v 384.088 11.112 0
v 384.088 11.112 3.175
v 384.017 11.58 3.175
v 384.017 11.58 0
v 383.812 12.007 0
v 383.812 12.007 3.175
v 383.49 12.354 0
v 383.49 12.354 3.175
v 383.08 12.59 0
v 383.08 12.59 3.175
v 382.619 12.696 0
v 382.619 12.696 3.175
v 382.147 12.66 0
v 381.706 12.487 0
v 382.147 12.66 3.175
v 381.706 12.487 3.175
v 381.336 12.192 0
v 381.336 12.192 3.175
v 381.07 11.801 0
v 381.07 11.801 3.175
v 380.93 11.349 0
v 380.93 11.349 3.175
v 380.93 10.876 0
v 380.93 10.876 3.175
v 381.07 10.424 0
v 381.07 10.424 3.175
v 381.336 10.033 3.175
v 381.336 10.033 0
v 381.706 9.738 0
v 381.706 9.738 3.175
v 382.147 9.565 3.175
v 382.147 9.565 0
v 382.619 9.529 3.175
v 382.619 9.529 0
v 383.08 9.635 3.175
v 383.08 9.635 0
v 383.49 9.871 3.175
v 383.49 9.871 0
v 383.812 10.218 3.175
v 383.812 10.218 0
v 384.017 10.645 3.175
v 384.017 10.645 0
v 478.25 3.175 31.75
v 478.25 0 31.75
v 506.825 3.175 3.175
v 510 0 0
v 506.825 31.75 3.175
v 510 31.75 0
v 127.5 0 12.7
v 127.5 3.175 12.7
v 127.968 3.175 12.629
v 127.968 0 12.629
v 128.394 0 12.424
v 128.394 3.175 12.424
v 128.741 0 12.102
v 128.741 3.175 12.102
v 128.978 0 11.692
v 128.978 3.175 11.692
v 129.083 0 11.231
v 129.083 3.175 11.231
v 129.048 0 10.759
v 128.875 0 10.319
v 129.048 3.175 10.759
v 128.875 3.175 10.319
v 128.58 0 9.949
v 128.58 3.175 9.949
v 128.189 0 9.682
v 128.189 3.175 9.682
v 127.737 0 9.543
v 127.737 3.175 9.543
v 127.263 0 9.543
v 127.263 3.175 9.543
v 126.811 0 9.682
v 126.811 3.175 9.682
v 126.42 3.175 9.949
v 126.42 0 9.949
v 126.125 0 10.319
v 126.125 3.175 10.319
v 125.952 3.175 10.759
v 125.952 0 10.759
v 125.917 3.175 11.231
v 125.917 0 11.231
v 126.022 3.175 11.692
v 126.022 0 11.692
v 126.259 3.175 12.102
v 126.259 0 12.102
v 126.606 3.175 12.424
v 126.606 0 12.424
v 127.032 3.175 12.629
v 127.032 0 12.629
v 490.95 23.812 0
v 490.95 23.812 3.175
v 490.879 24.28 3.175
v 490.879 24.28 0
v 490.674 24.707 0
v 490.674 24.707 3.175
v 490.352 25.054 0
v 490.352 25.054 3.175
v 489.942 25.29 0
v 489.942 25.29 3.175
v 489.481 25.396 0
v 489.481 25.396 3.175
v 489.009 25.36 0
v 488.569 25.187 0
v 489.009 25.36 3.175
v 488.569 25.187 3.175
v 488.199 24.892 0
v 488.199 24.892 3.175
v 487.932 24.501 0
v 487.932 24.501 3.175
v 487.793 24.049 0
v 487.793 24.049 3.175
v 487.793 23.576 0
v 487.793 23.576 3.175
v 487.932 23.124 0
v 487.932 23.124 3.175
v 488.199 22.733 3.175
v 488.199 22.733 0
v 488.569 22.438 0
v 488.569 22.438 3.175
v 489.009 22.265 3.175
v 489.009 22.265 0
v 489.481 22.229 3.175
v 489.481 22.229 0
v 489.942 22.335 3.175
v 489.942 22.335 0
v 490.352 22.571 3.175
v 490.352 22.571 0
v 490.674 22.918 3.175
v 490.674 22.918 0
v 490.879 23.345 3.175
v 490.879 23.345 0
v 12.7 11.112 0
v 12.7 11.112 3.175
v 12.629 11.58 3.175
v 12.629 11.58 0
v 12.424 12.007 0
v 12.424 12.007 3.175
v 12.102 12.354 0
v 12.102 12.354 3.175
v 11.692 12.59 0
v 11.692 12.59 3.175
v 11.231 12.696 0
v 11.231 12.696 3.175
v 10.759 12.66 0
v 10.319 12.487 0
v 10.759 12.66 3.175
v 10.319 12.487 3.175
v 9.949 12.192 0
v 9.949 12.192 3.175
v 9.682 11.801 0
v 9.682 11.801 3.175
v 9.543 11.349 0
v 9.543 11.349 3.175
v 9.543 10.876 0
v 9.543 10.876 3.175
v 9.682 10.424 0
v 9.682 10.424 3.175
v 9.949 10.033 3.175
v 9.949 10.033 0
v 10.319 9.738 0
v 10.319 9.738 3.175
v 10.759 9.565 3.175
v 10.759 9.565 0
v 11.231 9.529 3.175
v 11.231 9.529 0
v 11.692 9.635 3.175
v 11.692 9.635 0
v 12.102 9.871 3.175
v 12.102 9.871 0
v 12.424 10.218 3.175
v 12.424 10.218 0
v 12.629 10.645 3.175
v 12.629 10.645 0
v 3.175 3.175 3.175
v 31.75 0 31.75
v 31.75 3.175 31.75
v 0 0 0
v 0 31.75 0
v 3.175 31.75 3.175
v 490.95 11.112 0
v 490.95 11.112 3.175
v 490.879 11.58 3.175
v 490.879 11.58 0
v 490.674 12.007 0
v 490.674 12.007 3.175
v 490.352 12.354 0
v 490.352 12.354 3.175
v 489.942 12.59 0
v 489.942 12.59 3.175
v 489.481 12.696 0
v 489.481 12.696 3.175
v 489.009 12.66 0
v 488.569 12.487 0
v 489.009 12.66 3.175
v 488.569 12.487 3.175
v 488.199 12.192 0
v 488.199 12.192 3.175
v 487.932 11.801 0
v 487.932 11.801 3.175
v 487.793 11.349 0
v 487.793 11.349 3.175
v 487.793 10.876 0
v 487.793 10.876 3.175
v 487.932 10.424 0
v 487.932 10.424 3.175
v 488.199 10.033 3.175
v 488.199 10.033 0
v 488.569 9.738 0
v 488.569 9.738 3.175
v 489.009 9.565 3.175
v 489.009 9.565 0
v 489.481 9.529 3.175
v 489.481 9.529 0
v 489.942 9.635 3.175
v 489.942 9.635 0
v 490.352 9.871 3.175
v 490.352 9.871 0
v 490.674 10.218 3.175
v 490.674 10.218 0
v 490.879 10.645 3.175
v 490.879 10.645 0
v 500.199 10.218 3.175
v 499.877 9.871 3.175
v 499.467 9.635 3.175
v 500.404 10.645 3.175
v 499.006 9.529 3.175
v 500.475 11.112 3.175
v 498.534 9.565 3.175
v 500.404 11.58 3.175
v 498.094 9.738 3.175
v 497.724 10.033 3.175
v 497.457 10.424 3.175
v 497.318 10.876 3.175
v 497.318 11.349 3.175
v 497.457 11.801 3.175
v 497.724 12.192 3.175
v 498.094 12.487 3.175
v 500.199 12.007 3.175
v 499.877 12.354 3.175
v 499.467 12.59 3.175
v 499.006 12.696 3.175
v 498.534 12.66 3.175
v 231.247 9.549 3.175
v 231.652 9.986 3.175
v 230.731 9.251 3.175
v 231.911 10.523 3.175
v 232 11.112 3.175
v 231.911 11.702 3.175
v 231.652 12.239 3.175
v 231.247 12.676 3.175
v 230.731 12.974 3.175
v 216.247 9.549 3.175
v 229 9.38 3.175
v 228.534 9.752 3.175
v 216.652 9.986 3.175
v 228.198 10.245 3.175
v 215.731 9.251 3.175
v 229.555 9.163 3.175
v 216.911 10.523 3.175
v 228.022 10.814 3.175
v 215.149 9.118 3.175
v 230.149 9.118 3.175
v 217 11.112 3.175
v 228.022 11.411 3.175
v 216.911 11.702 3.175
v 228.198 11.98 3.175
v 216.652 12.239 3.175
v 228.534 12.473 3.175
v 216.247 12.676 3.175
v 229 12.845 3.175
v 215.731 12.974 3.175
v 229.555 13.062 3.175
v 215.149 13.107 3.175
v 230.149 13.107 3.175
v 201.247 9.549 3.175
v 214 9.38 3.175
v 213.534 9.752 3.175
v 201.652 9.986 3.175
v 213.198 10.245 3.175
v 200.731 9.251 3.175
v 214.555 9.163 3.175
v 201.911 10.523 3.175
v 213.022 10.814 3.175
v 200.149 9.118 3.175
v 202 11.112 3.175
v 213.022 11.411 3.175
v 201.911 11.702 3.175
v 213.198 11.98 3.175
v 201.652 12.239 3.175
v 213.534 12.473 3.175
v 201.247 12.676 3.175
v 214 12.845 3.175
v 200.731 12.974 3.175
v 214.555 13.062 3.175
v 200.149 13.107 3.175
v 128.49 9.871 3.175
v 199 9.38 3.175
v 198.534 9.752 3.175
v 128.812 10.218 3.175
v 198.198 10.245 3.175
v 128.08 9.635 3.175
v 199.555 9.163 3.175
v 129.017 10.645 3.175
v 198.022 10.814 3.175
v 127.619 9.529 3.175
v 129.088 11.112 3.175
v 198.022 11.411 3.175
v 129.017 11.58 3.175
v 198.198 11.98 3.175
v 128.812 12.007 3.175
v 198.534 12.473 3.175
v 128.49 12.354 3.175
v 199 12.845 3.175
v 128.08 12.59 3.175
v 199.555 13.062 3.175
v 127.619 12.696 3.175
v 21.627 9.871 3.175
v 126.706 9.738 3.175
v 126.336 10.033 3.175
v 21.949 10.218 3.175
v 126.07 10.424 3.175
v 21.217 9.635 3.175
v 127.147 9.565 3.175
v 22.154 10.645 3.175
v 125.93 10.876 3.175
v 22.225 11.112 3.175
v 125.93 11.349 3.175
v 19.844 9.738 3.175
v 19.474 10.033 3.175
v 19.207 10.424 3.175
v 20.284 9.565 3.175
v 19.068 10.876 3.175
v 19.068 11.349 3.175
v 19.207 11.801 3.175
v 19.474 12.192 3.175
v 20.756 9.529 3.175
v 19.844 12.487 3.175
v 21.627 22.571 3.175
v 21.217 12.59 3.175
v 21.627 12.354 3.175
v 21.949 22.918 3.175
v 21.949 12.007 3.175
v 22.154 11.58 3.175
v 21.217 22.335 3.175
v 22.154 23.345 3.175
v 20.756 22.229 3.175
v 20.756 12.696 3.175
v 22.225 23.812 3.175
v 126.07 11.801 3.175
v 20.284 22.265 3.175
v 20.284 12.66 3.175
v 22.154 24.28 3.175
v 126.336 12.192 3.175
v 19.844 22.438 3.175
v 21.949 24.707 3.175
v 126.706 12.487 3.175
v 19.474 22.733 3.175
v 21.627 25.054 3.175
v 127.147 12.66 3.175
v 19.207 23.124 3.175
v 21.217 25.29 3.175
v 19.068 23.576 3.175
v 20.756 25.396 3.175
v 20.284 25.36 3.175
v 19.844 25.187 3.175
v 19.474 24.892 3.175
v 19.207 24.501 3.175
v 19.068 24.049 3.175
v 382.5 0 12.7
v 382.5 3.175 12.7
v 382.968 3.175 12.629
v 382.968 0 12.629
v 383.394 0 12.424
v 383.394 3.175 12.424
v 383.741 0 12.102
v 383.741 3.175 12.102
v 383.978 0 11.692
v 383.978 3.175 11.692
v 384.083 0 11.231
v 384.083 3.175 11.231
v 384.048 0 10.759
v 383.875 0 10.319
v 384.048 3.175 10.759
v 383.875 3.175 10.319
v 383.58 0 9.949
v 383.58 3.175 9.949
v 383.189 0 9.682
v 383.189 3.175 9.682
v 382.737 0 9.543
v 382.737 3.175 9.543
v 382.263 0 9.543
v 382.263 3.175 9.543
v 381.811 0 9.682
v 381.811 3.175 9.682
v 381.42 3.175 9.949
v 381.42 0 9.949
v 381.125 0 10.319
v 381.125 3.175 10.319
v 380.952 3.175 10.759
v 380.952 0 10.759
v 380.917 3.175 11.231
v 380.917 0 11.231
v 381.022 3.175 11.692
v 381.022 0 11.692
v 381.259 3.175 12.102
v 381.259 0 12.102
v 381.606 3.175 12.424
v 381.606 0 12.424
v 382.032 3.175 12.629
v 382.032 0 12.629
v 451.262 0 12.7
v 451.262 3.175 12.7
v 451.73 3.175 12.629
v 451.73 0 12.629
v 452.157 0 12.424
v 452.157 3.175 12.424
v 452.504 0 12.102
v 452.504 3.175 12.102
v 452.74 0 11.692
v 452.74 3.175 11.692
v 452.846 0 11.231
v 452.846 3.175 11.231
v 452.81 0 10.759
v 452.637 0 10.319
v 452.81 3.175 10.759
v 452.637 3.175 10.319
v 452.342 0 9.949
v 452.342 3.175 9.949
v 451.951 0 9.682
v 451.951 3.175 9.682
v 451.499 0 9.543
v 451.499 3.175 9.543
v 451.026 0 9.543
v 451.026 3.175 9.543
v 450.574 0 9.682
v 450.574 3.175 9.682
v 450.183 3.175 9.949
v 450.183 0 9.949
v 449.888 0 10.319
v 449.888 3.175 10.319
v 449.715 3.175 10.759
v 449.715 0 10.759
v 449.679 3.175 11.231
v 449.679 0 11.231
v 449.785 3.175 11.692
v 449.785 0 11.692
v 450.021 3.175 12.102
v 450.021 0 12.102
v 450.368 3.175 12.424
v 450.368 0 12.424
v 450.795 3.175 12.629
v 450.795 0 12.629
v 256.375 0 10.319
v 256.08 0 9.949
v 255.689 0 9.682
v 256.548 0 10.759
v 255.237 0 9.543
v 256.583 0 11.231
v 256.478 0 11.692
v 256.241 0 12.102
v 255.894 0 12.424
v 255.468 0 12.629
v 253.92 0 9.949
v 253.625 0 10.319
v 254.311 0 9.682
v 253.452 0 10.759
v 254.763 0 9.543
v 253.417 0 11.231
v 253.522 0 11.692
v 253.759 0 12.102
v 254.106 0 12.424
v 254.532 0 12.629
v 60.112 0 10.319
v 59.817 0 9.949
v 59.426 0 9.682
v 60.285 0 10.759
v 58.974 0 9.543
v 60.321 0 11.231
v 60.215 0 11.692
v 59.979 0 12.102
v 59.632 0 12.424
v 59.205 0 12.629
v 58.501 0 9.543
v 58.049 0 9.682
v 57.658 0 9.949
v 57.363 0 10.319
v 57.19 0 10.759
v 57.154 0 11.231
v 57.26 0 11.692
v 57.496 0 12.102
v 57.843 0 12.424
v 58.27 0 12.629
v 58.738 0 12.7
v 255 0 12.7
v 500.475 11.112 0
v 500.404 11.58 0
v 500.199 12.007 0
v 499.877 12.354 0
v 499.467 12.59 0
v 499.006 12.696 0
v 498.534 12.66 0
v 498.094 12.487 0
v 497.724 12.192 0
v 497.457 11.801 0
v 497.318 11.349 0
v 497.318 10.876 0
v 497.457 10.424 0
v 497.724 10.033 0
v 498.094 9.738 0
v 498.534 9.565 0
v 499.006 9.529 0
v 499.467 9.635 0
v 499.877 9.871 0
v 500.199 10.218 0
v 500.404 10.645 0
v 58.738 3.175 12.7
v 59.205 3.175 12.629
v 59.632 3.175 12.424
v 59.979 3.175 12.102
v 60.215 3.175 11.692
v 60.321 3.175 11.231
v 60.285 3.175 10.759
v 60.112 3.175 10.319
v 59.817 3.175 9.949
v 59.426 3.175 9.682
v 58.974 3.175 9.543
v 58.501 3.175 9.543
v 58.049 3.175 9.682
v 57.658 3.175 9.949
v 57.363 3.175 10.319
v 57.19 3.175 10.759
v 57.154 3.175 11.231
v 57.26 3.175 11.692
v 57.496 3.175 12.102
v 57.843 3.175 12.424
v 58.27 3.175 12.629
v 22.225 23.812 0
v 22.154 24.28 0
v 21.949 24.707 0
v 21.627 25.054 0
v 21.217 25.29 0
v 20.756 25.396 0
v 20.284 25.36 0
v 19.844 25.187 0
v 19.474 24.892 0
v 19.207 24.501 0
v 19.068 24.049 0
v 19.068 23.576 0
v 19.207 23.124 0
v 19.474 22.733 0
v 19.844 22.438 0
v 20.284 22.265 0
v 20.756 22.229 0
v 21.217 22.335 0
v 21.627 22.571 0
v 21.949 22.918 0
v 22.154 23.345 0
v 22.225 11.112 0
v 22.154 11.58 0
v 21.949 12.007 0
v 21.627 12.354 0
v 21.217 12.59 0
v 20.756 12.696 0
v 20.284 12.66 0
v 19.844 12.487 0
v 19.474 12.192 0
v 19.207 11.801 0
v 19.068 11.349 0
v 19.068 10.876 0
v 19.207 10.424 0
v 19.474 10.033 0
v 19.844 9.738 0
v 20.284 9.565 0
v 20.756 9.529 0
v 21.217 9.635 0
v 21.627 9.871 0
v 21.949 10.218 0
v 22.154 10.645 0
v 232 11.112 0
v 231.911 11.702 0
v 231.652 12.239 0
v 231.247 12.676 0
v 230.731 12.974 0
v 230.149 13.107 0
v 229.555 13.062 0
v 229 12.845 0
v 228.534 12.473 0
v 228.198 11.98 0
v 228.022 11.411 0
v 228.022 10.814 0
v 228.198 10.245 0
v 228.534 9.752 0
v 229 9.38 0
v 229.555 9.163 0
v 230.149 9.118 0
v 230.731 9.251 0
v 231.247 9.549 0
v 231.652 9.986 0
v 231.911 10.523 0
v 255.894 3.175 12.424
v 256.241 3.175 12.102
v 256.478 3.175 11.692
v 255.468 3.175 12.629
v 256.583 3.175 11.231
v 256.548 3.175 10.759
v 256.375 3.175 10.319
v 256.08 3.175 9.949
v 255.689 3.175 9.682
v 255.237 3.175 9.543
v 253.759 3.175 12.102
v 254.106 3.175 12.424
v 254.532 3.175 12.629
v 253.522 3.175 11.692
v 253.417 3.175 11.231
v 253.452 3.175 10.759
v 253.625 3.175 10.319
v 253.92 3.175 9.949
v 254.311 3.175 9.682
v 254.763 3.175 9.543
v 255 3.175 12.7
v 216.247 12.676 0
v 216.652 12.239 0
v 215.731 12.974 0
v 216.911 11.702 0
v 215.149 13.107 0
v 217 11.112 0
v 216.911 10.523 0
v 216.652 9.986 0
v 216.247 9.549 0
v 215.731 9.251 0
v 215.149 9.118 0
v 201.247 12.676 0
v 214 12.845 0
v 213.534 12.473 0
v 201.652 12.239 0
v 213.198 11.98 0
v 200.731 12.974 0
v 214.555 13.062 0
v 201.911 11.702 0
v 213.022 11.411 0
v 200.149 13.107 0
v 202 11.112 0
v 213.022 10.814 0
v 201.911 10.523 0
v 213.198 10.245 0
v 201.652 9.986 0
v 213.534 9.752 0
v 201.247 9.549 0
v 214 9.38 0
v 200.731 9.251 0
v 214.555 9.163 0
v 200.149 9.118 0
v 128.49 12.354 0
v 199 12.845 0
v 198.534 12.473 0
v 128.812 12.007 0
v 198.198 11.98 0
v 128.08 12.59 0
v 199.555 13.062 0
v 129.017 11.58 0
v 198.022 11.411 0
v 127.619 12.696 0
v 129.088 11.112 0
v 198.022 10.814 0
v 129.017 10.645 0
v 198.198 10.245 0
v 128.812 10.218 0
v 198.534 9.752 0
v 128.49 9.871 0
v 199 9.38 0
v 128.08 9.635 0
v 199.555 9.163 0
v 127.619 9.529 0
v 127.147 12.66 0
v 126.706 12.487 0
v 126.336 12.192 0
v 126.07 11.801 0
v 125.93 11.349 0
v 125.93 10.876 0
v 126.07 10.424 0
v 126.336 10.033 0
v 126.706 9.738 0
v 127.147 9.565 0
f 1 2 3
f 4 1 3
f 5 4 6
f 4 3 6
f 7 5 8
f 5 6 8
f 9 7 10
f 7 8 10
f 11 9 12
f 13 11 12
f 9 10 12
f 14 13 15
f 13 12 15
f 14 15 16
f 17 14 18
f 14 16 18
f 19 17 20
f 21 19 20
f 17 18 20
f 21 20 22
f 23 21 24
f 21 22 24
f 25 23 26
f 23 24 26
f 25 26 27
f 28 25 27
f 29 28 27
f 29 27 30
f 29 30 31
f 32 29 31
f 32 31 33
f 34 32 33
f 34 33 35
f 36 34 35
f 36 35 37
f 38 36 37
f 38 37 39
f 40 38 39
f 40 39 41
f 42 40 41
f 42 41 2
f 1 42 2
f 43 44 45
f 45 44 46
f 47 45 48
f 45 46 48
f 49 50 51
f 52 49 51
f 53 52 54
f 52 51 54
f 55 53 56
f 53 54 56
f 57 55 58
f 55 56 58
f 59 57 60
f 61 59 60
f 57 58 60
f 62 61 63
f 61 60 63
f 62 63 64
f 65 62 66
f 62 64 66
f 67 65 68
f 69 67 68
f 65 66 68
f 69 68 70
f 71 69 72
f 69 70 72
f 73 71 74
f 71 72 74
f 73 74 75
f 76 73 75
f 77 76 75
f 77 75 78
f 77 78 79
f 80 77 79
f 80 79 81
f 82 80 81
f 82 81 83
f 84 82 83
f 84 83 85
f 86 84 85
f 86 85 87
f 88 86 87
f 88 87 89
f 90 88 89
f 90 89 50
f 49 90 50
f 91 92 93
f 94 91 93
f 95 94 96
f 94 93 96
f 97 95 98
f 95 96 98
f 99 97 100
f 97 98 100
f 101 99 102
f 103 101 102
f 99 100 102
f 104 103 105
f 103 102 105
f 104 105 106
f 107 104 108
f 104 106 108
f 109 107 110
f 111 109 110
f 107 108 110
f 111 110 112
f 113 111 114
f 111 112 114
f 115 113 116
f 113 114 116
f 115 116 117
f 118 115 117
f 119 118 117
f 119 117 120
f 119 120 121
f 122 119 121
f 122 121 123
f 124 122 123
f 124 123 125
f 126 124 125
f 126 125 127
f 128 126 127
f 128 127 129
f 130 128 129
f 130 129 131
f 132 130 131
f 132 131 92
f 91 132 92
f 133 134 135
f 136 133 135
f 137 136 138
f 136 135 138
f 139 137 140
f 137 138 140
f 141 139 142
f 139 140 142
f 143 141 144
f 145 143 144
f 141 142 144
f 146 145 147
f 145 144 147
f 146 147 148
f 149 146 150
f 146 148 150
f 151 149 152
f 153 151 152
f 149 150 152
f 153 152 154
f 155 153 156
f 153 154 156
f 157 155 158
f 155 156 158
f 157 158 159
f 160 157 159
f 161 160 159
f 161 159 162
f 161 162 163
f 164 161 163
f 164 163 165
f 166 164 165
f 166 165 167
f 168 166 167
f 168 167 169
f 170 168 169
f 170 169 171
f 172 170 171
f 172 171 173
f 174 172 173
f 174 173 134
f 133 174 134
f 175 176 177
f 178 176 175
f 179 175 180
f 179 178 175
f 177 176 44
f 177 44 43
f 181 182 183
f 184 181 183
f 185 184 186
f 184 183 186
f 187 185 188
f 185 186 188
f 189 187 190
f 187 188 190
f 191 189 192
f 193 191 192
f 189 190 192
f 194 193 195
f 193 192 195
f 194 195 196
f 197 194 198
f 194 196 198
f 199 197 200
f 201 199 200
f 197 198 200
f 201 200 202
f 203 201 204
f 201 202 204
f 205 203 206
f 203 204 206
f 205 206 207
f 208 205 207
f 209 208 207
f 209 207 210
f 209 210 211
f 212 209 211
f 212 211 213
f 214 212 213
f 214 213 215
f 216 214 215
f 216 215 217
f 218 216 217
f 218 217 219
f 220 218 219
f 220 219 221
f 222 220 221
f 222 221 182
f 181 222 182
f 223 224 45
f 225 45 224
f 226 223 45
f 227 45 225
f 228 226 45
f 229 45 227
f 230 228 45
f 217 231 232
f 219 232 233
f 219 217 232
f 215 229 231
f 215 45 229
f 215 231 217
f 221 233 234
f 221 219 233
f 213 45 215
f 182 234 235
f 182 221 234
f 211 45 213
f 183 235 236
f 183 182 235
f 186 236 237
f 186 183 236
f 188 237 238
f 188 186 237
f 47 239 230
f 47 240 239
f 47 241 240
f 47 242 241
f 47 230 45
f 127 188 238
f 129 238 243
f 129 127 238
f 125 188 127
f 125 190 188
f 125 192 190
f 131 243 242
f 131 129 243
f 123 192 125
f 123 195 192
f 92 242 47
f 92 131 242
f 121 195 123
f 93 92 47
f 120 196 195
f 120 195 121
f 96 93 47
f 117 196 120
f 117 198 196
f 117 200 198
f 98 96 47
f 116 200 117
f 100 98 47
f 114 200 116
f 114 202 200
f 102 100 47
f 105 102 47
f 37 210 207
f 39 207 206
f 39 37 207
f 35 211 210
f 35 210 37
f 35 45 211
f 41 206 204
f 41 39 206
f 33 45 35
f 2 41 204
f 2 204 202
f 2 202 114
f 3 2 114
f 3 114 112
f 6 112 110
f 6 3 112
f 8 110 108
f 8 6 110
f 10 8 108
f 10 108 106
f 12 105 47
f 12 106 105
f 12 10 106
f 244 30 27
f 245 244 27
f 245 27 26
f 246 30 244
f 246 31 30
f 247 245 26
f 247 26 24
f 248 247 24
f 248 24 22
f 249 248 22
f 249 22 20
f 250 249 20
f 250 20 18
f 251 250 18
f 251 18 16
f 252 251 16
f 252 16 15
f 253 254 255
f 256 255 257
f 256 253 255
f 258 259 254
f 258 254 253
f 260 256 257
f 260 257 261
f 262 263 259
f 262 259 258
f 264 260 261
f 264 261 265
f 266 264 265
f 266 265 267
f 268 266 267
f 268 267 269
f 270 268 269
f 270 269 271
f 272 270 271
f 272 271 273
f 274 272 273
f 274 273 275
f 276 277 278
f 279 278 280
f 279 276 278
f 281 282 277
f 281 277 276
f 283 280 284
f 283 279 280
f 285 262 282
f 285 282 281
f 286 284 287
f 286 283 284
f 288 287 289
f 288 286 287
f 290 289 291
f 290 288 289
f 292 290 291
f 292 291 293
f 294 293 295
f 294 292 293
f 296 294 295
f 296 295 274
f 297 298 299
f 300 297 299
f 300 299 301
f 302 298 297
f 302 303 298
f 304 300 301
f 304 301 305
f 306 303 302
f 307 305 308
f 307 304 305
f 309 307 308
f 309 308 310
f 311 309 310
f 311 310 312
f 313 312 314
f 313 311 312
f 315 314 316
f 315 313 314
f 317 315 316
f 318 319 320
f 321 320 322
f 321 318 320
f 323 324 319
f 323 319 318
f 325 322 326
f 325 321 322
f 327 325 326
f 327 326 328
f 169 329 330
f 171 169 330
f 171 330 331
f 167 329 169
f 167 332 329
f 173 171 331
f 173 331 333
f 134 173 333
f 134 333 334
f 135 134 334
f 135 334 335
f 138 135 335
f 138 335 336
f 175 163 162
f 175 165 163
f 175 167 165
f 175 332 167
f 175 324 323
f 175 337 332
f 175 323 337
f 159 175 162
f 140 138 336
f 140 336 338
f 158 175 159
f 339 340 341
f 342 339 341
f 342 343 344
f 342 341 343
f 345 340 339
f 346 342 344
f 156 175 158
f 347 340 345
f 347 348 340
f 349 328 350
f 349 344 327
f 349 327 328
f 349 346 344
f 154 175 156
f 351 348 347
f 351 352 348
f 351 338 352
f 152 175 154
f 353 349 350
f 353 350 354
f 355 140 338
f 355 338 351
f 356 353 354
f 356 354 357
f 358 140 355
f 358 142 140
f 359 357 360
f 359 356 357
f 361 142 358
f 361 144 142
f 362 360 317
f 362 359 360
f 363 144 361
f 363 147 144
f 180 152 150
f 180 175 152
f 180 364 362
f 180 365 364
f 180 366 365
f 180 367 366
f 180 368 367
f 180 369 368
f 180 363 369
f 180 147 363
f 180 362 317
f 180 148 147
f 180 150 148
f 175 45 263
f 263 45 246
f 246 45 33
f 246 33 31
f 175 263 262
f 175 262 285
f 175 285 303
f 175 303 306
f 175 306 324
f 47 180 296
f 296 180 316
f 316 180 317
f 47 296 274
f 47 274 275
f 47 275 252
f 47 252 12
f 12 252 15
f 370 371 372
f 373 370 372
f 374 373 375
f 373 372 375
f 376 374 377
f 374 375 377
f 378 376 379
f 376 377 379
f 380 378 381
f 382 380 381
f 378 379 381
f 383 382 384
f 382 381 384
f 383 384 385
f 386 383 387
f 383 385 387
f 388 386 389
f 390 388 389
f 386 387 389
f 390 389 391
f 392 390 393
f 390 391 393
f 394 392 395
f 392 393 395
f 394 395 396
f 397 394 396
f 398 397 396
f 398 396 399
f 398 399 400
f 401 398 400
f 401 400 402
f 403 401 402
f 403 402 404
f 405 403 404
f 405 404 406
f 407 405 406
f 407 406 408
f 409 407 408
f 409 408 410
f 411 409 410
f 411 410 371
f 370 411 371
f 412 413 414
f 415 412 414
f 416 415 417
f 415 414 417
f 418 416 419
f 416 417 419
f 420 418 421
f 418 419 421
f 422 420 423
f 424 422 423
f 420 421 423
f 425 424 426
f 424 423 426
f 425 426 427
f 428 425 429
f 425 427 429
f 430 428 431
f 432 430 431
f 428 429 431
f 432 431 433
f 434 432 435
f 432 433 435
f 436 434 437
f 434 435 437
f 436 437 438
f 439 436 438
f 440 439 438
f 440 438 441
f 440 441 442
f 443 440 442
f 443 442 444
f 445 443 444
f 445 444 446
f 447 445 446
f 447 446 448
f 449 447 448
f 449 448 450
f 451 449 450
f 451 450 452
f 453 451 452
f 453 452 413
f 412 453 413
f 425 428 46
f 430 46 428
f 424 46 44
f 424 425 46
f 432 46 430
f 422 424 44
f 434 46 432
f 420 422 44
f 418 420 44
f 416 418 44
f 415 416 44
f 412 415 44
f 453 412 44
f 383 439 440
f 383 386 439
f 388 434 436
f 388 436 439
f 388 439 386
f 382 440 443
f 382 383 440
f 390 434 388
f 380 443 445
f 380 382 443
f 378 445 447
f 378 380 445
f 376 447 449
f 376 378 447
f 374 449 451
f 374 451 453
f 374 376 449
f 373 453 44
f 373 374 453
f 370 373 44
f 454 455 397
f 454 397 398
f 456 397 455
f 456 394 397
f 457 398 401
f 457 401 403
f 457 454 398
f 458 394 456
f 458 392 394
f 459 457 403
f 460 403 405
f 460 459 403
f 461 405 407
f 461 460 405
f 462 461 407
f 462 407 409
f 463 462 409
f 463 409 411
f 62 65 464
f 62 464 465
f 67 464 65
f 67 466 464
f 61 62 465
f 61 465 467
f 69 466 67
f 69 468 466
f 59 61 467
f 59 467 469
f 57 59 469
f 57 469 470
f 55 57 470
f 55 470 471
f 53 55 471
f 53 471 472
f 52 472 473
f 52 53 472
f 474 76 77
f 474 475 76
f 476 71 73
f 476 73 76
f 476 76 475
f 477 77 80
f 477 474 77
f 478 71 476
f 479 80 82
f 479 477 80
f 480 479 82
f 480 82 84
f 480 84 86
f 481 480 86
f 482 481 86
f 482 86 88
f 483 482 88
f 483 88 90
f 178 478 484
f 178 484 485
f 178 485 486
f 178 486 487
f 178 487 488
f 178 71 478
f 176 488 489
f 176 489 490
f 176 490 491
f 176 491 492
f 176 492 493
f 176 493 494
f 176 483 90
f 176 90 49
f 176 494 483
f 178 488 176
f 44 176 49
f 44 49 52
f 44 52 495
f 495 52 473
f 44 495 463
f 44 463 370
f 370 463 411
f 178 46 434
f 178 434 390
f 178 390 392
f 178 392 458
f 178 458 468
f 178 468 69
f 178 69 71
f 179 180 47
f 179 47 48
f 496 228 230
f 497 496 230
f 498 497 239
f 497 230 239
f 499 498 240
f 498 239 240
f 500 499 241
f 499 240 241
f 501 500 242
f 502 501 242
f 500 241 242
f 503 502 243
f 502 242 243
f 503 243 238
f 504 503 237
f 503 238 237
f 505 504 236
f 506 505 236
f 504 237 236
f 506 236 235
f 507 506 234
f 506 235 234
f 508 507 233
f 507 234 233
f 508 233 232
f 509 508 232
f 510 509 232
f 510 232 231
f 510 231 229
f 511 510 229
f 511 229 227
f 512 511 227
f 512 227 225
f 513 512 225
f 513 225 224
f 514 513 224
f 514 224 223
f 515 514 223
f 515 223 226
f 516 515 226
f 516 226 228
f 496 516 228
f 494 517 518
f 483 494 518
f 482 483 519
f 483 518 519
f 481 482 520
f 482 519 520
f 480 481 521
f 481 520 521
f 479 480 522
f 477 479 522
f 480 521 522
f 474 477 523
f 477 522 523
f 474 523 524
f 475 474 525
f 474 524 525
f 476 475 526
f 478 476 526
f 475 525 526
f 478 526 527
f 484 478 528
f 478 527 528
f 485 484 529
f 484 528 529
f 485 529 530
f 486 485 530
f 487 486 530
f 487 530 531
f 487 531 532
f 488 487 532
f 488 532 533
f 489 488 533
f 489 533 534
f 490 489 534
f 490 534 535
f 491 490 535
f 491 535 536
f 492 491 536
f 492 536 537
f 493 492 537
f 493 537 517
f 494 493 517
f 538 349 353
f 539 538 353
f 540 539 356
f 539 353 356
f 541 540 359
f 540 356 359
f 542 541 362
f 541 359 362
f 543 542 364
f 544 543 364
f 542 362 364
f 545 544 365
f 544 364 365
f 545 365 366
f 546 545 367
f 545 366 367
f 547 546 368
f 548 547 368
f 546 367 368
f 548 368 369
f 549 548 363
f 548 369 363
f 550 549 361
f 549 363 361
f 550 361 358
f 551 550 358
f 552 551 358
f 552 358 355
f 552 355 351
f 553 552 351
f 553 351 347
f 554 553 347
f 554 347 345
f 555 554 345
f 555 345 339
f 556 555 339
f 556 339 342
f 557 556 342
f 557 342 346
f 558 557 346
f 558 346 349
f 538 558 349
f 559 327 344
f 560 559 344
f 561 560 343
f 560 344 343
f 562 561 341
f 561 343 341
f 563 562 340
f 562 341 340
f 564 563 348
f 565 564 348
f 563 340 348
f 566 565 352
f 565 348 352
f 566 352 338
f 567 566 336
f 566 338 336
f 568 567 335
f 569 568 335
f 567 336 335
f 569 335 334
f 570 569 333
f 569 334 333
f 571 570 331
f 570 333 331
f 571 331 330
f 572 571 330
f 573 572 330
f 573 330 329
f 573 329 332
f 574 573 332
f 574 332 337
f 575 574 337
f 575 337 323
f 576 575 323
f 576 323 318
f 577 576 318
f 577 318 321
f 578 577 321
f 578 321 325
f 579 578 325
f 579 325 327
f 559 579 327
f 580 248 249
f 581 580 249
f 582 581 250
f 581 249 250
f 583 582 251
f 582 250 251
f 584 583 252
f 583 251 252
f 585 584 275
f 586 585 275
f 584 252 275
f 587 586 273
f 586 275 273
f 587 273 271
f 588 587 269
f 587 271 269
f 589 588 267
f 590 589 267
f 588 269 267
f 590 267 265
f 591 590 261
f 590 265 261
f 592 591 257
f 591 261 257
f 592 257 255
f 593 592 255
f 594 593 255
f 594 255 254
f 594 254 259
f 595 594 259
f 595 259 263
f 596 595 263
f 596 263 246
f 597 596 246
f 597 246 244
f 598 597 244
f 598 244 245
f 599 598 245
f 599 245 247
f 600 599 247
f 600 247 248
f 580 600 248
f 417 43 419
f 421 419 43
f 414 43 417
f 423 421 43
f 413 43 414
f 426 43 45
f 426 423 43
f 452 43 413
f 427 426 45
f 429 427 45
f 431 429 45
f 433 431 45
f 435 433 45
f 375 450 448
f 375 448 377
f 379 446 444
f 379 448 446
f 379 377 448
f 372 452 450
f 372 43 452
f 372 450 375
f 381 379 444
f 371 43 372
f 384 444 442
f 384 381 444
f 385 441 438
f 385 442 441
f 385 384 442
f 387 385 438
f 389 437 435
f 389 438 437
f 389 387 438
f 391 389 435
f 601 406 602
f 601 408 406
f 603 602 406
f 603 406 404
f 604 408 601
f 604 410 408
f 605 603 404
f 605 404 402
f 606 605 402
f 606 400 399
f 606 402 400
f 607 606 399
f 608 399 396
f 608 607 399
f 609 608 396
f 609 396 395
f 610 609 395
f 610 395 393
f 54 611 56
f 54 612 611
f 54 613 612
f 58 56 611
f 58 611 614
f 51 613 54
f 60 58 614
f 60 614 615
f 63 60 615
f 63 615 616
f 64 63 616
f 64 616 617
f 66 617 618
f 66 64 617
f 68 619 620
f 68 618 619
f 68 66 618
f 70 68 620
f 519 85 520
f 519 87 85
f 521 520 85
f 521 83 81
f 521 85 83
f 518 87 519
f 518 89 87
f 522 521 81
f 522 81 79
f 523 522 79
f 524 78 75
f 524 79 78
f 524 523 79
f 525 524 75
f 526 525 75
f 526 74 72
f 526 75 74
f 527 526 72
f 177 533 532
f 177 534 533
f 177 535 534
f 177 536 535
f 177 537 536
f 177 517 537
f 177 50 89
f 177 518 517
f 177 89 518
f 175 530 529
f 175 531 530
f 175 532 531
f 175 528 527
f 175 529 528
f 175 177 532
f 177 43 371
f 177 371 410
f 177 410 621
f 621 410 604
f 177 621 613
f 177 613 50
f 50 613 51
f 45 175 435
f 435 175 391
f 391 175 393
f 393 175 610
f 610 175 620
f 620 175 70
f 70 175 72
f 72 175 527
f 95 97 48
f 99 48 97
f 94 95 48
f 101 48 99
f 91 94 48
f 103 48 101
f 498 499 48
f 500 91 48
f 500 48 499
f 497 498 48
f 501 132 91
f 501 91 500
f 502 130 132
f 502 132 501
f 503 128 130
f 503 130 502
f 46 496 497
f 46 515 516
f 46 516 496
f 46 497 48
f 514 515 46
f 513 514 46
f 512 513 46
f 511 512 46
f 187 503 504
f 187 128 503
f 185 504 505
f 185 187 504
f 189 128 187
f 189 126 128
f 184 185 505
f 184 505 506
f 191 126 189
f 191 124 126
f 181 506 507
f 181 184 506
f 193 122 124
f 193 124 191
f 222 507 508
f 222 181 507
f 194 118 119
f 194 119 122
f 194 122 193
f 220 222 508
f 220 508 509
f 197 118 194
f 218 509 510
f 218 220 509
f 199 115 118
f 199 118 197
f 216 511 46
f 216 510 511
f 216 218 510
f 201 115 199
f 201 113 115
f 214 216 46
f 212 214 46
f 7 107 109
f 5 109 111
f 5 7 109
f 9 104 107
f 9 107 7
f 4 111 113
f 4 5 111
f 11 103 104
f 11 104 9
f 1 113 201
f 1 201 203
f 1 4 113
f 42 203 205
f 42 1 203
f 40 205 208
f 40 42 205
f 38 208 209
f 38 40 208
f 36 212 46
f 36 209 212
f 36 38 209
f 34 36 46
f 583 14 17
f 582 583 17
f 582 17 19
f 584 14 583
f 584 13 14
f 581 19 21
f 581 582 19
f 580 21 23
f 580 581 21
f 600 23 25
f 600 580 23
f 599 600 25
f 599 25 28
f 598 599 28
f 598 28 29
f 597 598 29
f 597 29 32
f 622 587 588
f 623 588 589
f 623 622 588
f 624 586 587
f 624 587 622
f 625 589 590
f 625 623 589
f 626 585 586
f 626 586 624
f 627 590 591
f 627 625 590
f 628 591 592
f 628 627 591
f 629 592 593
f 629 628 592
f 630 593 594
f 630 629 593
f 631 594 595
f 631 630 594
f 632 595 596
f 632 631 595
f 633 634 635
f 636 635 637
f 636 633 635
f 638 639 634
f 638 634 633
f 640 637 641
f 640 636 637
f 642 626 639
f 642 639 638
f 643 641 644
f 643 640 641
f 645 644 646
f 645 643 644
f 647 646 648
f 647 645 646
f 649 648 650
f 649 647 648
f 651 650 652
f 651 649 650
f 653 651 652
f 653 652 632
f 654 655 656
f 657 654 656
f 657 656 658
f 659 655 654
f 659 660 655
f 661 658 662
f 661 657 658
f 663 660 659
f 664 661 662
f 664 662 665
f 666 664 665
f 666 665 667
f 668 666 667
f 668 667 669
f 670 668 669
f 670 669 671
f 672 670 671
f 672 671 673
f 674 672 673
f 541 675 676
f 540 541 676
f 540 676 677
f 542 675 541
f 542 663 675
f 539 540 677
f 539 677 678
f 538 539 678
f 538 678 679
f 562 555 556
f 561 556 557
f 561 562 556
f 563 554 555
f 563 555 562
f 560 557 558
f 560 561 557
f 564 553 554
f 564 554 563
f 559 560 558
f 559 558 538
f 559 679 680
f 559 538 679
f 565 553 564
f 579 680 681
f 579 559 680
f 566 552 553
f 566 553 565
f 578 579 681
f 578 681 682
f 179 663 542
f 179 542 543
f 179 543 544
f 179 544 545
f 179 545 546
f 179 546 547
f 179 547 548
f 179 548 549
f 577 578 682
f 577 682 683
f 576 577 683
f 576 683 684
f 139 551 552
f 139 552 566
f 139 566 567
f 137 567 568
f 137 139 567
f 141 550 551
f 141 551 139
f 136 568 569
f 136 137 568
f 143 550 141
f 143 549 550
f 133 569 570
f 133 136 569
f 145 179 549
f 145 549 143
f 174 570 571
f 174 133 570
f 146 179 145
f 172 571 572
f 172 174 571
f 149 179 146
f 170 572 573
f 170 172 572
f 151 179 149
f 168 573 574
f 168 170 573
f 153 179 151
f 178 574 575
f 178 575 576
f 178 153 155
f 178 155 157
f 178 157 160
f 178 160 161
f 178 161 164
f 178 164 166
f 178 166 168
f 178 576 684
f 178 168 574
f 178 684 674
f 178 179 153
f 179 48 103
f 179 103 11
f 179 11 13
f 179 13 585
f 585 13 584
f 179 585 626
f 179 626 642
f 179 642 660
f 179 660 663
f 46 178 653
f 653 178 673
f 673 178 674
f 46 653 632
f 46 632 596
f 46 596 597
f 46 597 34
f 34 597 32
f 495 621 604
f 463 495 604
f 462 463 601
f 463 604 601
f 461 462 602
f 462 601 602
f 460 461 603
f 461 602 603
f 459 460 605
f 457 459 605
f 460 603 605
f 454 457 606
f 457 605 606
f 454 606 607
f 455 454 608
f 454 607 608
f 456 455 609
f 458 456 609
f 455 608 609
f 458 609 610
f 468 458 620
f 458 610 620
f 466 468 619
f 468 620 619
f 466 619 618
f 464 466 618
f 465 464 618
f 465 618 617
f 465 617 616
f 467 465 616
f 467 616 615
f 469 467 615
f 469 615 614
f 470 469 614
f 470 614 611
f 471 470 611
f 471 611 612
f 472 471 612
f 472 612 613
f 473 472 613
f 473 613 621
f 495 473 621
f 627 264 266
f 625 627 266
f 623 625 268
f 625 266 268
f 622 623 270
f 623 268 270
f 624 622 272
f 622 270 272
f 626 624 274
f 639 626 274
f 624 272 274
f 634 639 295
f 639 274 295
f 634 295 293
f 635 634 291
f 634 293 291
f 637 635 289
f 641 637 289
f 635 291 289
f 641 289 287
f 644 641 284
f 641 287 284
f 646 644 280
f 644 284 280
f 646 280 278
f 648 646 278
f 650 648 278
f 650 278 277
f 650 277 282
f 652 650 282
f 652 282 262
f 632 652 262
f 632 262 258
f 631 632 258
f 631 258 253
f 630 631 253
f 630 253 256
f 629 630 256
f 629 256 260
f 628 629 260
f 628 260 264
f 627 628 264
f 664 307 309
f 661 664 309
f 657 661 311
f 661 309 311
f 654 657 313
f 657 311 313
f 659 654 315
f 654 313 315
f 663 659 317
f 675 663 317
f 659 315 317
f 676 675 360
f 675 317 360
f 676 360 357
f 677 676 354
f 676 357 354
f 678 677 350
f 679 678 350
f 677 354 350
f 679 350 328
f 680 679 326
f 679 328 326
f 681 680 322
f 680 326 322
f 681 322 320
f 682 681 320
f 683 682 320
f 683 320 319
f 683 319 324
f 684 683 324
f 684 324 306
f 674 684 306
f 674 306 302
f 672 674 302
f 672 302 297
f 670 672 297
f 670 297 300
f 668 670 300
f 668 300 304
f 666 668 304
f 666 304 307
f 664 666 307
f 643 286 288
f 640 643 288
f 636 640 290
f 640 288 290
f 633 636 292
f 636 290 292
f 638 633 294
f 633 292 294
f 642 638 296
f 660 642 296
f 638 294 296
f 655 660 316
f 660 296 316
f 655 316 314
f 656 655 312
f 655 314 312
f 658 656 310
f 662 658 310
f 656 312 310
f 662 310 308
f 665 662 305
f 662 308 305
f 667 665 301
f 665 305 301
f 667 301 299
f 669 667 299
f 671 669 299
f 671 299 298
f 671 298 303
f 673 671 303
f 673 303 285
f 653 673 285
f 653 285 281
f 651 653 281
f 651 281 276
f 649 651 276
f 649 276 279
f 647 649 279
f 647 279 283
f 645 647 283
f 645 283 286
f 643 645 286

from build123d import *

# Parameters (mm, degrees)
BOSS_EXTRUDE1_DEPTH          = 510
CHAMFER6_SIZE                = 31.75
CHAMFER7_SIZE                = 31.75
TOPHOLES_SKETCH3_R           = 1.5875
TOPHOLES_CUT_EXTRUDE2_DEPTH  = 512.785690622
BACKHOLES_SKETCH4_R          = 1.5875
BACKHOLES_SKETCH4_R_2        = 2
BACKHOLES_CUT_EXTRUDE3_DEPTH = 512.785690622


with BuildPart() as part:
    # Sketch1 → Boss-Extrude1 (new body)
    with BuildSketch(Plane(origin=(0, 0, 0), x_dir=(0, 0, -1), z_dir=(1, 0, 0))):
        Polygon((0, 0), (-31.75, 0), (-31.75, 3.175), (-3.175, 3.175), (-3.175, 31.75), (0, 31.75), align=None)
    extrude(amount=BOSS_EXTRUDE1_DEPTH)

    # Chamfer6
    chamfer6_edges = [part.edges().sort_by_distance(p)[0] for p in [
        (510, 1.5875, 31.75),
    ]]
    chamfer(chamfer6_edges, length=CHAMFER6_SIZE - 0.0001)  # a hair under: the kernel refuses the full size

    # Chamfer7
    chamfer7_edges = [part.edges().sort_by_distance(p)[0] for p in [
        (0, 1.5875, 31.75),
    ]]
    chamfer(chamfer7_edges, length=CHAMFER7_SIZE - 0.0001)  # a hair under: the kernel refuses the full size

    # TopHoles-Sketch3 → TopHoles-Cut-Extrude2 (cut, through all)
    with BuildSketch(Plane(origin=(0, 3.175, 0), x_dir=(1, 0, 0), z_dir=(0, 1, 0))):
        with Locations(Location((451.2625, -11.1125, 0), (0, 0, 270))):
            Circle(TOPHOLES_SKETCH3_R)
        with Locations(Location((58.7375, -11.1125, 0), (0, 0, 270))):
            Circle(TOPHOLES_SKETCH3_R)
        with Locations(Location((127.5, -11.1125, 0), (0, 0, 270))):
            Circle(TOPHOLES_SKETCH3_R)
        with Locations(Location((255, -11.1125, 0), (0, 0, 270))):
            Circle(TOPHOLES_SKETCH3_R)
        with Locations(Location((382.5, -11.1125, 0), (0, 0, 270))):
            Circle(TOPHOLES_SKETCH3_R)
    extrude(amount=-TOPHOLES_CUT_EXTRUDE2_DEPTH, mode=Mode.SUBTRACT)

    # BackHoles-Sketch4 → BackHoles-Cut-Extrude3 (cut, through all)
    with BuildSketch(Plane.XY.offset(3.175)):
        with Locations((489.3625, 23.8125)):
            Circle(BACKHOLES_SKETCH4_R)
        with Locations((20.6375, 23.8125)):
            Circle(BACKHOLES_SKETCH4_R)
        with Locations((11.1125, 11.1125)):
            Circle(BACKHOLES_SKETCH4_R)
        with Locations((20.6375, 11.1125)):
            Circle(BACKHOLES_SKETCH4_R)
        with Locations((489.3625, 11.1125)):
            Circle(BACKHOLES_SKETCH4_R)
        with Locations((498.8875, 11.1125)):
            Circle(BACKHOLES_SKETCH4_R)
        with Locations((200, 11.1125)):
            Circle(BACKHOLES_SKETCH4_R_2)
        with Locations((215, 11.1125)):
            Circle(BACKHOLES_SKETCH4_R_2)
        with Locations((230, 11.1125)):
            Circle(BACKHOLES_SKETCH4_R_2)
        with Locations((127.5, 11.1125)):
            Circle(BACKHOLES_SKETCH4_R)
        with Locations((382.5, 11.1125)):
            Circle(BACKHOLES_SKETCH4_R)
    extrude(amount=-BACKHOLES_CUT_EXTRUDE3_DEPTH, mode=Mode.SUBTRACT)


solid = part.part
